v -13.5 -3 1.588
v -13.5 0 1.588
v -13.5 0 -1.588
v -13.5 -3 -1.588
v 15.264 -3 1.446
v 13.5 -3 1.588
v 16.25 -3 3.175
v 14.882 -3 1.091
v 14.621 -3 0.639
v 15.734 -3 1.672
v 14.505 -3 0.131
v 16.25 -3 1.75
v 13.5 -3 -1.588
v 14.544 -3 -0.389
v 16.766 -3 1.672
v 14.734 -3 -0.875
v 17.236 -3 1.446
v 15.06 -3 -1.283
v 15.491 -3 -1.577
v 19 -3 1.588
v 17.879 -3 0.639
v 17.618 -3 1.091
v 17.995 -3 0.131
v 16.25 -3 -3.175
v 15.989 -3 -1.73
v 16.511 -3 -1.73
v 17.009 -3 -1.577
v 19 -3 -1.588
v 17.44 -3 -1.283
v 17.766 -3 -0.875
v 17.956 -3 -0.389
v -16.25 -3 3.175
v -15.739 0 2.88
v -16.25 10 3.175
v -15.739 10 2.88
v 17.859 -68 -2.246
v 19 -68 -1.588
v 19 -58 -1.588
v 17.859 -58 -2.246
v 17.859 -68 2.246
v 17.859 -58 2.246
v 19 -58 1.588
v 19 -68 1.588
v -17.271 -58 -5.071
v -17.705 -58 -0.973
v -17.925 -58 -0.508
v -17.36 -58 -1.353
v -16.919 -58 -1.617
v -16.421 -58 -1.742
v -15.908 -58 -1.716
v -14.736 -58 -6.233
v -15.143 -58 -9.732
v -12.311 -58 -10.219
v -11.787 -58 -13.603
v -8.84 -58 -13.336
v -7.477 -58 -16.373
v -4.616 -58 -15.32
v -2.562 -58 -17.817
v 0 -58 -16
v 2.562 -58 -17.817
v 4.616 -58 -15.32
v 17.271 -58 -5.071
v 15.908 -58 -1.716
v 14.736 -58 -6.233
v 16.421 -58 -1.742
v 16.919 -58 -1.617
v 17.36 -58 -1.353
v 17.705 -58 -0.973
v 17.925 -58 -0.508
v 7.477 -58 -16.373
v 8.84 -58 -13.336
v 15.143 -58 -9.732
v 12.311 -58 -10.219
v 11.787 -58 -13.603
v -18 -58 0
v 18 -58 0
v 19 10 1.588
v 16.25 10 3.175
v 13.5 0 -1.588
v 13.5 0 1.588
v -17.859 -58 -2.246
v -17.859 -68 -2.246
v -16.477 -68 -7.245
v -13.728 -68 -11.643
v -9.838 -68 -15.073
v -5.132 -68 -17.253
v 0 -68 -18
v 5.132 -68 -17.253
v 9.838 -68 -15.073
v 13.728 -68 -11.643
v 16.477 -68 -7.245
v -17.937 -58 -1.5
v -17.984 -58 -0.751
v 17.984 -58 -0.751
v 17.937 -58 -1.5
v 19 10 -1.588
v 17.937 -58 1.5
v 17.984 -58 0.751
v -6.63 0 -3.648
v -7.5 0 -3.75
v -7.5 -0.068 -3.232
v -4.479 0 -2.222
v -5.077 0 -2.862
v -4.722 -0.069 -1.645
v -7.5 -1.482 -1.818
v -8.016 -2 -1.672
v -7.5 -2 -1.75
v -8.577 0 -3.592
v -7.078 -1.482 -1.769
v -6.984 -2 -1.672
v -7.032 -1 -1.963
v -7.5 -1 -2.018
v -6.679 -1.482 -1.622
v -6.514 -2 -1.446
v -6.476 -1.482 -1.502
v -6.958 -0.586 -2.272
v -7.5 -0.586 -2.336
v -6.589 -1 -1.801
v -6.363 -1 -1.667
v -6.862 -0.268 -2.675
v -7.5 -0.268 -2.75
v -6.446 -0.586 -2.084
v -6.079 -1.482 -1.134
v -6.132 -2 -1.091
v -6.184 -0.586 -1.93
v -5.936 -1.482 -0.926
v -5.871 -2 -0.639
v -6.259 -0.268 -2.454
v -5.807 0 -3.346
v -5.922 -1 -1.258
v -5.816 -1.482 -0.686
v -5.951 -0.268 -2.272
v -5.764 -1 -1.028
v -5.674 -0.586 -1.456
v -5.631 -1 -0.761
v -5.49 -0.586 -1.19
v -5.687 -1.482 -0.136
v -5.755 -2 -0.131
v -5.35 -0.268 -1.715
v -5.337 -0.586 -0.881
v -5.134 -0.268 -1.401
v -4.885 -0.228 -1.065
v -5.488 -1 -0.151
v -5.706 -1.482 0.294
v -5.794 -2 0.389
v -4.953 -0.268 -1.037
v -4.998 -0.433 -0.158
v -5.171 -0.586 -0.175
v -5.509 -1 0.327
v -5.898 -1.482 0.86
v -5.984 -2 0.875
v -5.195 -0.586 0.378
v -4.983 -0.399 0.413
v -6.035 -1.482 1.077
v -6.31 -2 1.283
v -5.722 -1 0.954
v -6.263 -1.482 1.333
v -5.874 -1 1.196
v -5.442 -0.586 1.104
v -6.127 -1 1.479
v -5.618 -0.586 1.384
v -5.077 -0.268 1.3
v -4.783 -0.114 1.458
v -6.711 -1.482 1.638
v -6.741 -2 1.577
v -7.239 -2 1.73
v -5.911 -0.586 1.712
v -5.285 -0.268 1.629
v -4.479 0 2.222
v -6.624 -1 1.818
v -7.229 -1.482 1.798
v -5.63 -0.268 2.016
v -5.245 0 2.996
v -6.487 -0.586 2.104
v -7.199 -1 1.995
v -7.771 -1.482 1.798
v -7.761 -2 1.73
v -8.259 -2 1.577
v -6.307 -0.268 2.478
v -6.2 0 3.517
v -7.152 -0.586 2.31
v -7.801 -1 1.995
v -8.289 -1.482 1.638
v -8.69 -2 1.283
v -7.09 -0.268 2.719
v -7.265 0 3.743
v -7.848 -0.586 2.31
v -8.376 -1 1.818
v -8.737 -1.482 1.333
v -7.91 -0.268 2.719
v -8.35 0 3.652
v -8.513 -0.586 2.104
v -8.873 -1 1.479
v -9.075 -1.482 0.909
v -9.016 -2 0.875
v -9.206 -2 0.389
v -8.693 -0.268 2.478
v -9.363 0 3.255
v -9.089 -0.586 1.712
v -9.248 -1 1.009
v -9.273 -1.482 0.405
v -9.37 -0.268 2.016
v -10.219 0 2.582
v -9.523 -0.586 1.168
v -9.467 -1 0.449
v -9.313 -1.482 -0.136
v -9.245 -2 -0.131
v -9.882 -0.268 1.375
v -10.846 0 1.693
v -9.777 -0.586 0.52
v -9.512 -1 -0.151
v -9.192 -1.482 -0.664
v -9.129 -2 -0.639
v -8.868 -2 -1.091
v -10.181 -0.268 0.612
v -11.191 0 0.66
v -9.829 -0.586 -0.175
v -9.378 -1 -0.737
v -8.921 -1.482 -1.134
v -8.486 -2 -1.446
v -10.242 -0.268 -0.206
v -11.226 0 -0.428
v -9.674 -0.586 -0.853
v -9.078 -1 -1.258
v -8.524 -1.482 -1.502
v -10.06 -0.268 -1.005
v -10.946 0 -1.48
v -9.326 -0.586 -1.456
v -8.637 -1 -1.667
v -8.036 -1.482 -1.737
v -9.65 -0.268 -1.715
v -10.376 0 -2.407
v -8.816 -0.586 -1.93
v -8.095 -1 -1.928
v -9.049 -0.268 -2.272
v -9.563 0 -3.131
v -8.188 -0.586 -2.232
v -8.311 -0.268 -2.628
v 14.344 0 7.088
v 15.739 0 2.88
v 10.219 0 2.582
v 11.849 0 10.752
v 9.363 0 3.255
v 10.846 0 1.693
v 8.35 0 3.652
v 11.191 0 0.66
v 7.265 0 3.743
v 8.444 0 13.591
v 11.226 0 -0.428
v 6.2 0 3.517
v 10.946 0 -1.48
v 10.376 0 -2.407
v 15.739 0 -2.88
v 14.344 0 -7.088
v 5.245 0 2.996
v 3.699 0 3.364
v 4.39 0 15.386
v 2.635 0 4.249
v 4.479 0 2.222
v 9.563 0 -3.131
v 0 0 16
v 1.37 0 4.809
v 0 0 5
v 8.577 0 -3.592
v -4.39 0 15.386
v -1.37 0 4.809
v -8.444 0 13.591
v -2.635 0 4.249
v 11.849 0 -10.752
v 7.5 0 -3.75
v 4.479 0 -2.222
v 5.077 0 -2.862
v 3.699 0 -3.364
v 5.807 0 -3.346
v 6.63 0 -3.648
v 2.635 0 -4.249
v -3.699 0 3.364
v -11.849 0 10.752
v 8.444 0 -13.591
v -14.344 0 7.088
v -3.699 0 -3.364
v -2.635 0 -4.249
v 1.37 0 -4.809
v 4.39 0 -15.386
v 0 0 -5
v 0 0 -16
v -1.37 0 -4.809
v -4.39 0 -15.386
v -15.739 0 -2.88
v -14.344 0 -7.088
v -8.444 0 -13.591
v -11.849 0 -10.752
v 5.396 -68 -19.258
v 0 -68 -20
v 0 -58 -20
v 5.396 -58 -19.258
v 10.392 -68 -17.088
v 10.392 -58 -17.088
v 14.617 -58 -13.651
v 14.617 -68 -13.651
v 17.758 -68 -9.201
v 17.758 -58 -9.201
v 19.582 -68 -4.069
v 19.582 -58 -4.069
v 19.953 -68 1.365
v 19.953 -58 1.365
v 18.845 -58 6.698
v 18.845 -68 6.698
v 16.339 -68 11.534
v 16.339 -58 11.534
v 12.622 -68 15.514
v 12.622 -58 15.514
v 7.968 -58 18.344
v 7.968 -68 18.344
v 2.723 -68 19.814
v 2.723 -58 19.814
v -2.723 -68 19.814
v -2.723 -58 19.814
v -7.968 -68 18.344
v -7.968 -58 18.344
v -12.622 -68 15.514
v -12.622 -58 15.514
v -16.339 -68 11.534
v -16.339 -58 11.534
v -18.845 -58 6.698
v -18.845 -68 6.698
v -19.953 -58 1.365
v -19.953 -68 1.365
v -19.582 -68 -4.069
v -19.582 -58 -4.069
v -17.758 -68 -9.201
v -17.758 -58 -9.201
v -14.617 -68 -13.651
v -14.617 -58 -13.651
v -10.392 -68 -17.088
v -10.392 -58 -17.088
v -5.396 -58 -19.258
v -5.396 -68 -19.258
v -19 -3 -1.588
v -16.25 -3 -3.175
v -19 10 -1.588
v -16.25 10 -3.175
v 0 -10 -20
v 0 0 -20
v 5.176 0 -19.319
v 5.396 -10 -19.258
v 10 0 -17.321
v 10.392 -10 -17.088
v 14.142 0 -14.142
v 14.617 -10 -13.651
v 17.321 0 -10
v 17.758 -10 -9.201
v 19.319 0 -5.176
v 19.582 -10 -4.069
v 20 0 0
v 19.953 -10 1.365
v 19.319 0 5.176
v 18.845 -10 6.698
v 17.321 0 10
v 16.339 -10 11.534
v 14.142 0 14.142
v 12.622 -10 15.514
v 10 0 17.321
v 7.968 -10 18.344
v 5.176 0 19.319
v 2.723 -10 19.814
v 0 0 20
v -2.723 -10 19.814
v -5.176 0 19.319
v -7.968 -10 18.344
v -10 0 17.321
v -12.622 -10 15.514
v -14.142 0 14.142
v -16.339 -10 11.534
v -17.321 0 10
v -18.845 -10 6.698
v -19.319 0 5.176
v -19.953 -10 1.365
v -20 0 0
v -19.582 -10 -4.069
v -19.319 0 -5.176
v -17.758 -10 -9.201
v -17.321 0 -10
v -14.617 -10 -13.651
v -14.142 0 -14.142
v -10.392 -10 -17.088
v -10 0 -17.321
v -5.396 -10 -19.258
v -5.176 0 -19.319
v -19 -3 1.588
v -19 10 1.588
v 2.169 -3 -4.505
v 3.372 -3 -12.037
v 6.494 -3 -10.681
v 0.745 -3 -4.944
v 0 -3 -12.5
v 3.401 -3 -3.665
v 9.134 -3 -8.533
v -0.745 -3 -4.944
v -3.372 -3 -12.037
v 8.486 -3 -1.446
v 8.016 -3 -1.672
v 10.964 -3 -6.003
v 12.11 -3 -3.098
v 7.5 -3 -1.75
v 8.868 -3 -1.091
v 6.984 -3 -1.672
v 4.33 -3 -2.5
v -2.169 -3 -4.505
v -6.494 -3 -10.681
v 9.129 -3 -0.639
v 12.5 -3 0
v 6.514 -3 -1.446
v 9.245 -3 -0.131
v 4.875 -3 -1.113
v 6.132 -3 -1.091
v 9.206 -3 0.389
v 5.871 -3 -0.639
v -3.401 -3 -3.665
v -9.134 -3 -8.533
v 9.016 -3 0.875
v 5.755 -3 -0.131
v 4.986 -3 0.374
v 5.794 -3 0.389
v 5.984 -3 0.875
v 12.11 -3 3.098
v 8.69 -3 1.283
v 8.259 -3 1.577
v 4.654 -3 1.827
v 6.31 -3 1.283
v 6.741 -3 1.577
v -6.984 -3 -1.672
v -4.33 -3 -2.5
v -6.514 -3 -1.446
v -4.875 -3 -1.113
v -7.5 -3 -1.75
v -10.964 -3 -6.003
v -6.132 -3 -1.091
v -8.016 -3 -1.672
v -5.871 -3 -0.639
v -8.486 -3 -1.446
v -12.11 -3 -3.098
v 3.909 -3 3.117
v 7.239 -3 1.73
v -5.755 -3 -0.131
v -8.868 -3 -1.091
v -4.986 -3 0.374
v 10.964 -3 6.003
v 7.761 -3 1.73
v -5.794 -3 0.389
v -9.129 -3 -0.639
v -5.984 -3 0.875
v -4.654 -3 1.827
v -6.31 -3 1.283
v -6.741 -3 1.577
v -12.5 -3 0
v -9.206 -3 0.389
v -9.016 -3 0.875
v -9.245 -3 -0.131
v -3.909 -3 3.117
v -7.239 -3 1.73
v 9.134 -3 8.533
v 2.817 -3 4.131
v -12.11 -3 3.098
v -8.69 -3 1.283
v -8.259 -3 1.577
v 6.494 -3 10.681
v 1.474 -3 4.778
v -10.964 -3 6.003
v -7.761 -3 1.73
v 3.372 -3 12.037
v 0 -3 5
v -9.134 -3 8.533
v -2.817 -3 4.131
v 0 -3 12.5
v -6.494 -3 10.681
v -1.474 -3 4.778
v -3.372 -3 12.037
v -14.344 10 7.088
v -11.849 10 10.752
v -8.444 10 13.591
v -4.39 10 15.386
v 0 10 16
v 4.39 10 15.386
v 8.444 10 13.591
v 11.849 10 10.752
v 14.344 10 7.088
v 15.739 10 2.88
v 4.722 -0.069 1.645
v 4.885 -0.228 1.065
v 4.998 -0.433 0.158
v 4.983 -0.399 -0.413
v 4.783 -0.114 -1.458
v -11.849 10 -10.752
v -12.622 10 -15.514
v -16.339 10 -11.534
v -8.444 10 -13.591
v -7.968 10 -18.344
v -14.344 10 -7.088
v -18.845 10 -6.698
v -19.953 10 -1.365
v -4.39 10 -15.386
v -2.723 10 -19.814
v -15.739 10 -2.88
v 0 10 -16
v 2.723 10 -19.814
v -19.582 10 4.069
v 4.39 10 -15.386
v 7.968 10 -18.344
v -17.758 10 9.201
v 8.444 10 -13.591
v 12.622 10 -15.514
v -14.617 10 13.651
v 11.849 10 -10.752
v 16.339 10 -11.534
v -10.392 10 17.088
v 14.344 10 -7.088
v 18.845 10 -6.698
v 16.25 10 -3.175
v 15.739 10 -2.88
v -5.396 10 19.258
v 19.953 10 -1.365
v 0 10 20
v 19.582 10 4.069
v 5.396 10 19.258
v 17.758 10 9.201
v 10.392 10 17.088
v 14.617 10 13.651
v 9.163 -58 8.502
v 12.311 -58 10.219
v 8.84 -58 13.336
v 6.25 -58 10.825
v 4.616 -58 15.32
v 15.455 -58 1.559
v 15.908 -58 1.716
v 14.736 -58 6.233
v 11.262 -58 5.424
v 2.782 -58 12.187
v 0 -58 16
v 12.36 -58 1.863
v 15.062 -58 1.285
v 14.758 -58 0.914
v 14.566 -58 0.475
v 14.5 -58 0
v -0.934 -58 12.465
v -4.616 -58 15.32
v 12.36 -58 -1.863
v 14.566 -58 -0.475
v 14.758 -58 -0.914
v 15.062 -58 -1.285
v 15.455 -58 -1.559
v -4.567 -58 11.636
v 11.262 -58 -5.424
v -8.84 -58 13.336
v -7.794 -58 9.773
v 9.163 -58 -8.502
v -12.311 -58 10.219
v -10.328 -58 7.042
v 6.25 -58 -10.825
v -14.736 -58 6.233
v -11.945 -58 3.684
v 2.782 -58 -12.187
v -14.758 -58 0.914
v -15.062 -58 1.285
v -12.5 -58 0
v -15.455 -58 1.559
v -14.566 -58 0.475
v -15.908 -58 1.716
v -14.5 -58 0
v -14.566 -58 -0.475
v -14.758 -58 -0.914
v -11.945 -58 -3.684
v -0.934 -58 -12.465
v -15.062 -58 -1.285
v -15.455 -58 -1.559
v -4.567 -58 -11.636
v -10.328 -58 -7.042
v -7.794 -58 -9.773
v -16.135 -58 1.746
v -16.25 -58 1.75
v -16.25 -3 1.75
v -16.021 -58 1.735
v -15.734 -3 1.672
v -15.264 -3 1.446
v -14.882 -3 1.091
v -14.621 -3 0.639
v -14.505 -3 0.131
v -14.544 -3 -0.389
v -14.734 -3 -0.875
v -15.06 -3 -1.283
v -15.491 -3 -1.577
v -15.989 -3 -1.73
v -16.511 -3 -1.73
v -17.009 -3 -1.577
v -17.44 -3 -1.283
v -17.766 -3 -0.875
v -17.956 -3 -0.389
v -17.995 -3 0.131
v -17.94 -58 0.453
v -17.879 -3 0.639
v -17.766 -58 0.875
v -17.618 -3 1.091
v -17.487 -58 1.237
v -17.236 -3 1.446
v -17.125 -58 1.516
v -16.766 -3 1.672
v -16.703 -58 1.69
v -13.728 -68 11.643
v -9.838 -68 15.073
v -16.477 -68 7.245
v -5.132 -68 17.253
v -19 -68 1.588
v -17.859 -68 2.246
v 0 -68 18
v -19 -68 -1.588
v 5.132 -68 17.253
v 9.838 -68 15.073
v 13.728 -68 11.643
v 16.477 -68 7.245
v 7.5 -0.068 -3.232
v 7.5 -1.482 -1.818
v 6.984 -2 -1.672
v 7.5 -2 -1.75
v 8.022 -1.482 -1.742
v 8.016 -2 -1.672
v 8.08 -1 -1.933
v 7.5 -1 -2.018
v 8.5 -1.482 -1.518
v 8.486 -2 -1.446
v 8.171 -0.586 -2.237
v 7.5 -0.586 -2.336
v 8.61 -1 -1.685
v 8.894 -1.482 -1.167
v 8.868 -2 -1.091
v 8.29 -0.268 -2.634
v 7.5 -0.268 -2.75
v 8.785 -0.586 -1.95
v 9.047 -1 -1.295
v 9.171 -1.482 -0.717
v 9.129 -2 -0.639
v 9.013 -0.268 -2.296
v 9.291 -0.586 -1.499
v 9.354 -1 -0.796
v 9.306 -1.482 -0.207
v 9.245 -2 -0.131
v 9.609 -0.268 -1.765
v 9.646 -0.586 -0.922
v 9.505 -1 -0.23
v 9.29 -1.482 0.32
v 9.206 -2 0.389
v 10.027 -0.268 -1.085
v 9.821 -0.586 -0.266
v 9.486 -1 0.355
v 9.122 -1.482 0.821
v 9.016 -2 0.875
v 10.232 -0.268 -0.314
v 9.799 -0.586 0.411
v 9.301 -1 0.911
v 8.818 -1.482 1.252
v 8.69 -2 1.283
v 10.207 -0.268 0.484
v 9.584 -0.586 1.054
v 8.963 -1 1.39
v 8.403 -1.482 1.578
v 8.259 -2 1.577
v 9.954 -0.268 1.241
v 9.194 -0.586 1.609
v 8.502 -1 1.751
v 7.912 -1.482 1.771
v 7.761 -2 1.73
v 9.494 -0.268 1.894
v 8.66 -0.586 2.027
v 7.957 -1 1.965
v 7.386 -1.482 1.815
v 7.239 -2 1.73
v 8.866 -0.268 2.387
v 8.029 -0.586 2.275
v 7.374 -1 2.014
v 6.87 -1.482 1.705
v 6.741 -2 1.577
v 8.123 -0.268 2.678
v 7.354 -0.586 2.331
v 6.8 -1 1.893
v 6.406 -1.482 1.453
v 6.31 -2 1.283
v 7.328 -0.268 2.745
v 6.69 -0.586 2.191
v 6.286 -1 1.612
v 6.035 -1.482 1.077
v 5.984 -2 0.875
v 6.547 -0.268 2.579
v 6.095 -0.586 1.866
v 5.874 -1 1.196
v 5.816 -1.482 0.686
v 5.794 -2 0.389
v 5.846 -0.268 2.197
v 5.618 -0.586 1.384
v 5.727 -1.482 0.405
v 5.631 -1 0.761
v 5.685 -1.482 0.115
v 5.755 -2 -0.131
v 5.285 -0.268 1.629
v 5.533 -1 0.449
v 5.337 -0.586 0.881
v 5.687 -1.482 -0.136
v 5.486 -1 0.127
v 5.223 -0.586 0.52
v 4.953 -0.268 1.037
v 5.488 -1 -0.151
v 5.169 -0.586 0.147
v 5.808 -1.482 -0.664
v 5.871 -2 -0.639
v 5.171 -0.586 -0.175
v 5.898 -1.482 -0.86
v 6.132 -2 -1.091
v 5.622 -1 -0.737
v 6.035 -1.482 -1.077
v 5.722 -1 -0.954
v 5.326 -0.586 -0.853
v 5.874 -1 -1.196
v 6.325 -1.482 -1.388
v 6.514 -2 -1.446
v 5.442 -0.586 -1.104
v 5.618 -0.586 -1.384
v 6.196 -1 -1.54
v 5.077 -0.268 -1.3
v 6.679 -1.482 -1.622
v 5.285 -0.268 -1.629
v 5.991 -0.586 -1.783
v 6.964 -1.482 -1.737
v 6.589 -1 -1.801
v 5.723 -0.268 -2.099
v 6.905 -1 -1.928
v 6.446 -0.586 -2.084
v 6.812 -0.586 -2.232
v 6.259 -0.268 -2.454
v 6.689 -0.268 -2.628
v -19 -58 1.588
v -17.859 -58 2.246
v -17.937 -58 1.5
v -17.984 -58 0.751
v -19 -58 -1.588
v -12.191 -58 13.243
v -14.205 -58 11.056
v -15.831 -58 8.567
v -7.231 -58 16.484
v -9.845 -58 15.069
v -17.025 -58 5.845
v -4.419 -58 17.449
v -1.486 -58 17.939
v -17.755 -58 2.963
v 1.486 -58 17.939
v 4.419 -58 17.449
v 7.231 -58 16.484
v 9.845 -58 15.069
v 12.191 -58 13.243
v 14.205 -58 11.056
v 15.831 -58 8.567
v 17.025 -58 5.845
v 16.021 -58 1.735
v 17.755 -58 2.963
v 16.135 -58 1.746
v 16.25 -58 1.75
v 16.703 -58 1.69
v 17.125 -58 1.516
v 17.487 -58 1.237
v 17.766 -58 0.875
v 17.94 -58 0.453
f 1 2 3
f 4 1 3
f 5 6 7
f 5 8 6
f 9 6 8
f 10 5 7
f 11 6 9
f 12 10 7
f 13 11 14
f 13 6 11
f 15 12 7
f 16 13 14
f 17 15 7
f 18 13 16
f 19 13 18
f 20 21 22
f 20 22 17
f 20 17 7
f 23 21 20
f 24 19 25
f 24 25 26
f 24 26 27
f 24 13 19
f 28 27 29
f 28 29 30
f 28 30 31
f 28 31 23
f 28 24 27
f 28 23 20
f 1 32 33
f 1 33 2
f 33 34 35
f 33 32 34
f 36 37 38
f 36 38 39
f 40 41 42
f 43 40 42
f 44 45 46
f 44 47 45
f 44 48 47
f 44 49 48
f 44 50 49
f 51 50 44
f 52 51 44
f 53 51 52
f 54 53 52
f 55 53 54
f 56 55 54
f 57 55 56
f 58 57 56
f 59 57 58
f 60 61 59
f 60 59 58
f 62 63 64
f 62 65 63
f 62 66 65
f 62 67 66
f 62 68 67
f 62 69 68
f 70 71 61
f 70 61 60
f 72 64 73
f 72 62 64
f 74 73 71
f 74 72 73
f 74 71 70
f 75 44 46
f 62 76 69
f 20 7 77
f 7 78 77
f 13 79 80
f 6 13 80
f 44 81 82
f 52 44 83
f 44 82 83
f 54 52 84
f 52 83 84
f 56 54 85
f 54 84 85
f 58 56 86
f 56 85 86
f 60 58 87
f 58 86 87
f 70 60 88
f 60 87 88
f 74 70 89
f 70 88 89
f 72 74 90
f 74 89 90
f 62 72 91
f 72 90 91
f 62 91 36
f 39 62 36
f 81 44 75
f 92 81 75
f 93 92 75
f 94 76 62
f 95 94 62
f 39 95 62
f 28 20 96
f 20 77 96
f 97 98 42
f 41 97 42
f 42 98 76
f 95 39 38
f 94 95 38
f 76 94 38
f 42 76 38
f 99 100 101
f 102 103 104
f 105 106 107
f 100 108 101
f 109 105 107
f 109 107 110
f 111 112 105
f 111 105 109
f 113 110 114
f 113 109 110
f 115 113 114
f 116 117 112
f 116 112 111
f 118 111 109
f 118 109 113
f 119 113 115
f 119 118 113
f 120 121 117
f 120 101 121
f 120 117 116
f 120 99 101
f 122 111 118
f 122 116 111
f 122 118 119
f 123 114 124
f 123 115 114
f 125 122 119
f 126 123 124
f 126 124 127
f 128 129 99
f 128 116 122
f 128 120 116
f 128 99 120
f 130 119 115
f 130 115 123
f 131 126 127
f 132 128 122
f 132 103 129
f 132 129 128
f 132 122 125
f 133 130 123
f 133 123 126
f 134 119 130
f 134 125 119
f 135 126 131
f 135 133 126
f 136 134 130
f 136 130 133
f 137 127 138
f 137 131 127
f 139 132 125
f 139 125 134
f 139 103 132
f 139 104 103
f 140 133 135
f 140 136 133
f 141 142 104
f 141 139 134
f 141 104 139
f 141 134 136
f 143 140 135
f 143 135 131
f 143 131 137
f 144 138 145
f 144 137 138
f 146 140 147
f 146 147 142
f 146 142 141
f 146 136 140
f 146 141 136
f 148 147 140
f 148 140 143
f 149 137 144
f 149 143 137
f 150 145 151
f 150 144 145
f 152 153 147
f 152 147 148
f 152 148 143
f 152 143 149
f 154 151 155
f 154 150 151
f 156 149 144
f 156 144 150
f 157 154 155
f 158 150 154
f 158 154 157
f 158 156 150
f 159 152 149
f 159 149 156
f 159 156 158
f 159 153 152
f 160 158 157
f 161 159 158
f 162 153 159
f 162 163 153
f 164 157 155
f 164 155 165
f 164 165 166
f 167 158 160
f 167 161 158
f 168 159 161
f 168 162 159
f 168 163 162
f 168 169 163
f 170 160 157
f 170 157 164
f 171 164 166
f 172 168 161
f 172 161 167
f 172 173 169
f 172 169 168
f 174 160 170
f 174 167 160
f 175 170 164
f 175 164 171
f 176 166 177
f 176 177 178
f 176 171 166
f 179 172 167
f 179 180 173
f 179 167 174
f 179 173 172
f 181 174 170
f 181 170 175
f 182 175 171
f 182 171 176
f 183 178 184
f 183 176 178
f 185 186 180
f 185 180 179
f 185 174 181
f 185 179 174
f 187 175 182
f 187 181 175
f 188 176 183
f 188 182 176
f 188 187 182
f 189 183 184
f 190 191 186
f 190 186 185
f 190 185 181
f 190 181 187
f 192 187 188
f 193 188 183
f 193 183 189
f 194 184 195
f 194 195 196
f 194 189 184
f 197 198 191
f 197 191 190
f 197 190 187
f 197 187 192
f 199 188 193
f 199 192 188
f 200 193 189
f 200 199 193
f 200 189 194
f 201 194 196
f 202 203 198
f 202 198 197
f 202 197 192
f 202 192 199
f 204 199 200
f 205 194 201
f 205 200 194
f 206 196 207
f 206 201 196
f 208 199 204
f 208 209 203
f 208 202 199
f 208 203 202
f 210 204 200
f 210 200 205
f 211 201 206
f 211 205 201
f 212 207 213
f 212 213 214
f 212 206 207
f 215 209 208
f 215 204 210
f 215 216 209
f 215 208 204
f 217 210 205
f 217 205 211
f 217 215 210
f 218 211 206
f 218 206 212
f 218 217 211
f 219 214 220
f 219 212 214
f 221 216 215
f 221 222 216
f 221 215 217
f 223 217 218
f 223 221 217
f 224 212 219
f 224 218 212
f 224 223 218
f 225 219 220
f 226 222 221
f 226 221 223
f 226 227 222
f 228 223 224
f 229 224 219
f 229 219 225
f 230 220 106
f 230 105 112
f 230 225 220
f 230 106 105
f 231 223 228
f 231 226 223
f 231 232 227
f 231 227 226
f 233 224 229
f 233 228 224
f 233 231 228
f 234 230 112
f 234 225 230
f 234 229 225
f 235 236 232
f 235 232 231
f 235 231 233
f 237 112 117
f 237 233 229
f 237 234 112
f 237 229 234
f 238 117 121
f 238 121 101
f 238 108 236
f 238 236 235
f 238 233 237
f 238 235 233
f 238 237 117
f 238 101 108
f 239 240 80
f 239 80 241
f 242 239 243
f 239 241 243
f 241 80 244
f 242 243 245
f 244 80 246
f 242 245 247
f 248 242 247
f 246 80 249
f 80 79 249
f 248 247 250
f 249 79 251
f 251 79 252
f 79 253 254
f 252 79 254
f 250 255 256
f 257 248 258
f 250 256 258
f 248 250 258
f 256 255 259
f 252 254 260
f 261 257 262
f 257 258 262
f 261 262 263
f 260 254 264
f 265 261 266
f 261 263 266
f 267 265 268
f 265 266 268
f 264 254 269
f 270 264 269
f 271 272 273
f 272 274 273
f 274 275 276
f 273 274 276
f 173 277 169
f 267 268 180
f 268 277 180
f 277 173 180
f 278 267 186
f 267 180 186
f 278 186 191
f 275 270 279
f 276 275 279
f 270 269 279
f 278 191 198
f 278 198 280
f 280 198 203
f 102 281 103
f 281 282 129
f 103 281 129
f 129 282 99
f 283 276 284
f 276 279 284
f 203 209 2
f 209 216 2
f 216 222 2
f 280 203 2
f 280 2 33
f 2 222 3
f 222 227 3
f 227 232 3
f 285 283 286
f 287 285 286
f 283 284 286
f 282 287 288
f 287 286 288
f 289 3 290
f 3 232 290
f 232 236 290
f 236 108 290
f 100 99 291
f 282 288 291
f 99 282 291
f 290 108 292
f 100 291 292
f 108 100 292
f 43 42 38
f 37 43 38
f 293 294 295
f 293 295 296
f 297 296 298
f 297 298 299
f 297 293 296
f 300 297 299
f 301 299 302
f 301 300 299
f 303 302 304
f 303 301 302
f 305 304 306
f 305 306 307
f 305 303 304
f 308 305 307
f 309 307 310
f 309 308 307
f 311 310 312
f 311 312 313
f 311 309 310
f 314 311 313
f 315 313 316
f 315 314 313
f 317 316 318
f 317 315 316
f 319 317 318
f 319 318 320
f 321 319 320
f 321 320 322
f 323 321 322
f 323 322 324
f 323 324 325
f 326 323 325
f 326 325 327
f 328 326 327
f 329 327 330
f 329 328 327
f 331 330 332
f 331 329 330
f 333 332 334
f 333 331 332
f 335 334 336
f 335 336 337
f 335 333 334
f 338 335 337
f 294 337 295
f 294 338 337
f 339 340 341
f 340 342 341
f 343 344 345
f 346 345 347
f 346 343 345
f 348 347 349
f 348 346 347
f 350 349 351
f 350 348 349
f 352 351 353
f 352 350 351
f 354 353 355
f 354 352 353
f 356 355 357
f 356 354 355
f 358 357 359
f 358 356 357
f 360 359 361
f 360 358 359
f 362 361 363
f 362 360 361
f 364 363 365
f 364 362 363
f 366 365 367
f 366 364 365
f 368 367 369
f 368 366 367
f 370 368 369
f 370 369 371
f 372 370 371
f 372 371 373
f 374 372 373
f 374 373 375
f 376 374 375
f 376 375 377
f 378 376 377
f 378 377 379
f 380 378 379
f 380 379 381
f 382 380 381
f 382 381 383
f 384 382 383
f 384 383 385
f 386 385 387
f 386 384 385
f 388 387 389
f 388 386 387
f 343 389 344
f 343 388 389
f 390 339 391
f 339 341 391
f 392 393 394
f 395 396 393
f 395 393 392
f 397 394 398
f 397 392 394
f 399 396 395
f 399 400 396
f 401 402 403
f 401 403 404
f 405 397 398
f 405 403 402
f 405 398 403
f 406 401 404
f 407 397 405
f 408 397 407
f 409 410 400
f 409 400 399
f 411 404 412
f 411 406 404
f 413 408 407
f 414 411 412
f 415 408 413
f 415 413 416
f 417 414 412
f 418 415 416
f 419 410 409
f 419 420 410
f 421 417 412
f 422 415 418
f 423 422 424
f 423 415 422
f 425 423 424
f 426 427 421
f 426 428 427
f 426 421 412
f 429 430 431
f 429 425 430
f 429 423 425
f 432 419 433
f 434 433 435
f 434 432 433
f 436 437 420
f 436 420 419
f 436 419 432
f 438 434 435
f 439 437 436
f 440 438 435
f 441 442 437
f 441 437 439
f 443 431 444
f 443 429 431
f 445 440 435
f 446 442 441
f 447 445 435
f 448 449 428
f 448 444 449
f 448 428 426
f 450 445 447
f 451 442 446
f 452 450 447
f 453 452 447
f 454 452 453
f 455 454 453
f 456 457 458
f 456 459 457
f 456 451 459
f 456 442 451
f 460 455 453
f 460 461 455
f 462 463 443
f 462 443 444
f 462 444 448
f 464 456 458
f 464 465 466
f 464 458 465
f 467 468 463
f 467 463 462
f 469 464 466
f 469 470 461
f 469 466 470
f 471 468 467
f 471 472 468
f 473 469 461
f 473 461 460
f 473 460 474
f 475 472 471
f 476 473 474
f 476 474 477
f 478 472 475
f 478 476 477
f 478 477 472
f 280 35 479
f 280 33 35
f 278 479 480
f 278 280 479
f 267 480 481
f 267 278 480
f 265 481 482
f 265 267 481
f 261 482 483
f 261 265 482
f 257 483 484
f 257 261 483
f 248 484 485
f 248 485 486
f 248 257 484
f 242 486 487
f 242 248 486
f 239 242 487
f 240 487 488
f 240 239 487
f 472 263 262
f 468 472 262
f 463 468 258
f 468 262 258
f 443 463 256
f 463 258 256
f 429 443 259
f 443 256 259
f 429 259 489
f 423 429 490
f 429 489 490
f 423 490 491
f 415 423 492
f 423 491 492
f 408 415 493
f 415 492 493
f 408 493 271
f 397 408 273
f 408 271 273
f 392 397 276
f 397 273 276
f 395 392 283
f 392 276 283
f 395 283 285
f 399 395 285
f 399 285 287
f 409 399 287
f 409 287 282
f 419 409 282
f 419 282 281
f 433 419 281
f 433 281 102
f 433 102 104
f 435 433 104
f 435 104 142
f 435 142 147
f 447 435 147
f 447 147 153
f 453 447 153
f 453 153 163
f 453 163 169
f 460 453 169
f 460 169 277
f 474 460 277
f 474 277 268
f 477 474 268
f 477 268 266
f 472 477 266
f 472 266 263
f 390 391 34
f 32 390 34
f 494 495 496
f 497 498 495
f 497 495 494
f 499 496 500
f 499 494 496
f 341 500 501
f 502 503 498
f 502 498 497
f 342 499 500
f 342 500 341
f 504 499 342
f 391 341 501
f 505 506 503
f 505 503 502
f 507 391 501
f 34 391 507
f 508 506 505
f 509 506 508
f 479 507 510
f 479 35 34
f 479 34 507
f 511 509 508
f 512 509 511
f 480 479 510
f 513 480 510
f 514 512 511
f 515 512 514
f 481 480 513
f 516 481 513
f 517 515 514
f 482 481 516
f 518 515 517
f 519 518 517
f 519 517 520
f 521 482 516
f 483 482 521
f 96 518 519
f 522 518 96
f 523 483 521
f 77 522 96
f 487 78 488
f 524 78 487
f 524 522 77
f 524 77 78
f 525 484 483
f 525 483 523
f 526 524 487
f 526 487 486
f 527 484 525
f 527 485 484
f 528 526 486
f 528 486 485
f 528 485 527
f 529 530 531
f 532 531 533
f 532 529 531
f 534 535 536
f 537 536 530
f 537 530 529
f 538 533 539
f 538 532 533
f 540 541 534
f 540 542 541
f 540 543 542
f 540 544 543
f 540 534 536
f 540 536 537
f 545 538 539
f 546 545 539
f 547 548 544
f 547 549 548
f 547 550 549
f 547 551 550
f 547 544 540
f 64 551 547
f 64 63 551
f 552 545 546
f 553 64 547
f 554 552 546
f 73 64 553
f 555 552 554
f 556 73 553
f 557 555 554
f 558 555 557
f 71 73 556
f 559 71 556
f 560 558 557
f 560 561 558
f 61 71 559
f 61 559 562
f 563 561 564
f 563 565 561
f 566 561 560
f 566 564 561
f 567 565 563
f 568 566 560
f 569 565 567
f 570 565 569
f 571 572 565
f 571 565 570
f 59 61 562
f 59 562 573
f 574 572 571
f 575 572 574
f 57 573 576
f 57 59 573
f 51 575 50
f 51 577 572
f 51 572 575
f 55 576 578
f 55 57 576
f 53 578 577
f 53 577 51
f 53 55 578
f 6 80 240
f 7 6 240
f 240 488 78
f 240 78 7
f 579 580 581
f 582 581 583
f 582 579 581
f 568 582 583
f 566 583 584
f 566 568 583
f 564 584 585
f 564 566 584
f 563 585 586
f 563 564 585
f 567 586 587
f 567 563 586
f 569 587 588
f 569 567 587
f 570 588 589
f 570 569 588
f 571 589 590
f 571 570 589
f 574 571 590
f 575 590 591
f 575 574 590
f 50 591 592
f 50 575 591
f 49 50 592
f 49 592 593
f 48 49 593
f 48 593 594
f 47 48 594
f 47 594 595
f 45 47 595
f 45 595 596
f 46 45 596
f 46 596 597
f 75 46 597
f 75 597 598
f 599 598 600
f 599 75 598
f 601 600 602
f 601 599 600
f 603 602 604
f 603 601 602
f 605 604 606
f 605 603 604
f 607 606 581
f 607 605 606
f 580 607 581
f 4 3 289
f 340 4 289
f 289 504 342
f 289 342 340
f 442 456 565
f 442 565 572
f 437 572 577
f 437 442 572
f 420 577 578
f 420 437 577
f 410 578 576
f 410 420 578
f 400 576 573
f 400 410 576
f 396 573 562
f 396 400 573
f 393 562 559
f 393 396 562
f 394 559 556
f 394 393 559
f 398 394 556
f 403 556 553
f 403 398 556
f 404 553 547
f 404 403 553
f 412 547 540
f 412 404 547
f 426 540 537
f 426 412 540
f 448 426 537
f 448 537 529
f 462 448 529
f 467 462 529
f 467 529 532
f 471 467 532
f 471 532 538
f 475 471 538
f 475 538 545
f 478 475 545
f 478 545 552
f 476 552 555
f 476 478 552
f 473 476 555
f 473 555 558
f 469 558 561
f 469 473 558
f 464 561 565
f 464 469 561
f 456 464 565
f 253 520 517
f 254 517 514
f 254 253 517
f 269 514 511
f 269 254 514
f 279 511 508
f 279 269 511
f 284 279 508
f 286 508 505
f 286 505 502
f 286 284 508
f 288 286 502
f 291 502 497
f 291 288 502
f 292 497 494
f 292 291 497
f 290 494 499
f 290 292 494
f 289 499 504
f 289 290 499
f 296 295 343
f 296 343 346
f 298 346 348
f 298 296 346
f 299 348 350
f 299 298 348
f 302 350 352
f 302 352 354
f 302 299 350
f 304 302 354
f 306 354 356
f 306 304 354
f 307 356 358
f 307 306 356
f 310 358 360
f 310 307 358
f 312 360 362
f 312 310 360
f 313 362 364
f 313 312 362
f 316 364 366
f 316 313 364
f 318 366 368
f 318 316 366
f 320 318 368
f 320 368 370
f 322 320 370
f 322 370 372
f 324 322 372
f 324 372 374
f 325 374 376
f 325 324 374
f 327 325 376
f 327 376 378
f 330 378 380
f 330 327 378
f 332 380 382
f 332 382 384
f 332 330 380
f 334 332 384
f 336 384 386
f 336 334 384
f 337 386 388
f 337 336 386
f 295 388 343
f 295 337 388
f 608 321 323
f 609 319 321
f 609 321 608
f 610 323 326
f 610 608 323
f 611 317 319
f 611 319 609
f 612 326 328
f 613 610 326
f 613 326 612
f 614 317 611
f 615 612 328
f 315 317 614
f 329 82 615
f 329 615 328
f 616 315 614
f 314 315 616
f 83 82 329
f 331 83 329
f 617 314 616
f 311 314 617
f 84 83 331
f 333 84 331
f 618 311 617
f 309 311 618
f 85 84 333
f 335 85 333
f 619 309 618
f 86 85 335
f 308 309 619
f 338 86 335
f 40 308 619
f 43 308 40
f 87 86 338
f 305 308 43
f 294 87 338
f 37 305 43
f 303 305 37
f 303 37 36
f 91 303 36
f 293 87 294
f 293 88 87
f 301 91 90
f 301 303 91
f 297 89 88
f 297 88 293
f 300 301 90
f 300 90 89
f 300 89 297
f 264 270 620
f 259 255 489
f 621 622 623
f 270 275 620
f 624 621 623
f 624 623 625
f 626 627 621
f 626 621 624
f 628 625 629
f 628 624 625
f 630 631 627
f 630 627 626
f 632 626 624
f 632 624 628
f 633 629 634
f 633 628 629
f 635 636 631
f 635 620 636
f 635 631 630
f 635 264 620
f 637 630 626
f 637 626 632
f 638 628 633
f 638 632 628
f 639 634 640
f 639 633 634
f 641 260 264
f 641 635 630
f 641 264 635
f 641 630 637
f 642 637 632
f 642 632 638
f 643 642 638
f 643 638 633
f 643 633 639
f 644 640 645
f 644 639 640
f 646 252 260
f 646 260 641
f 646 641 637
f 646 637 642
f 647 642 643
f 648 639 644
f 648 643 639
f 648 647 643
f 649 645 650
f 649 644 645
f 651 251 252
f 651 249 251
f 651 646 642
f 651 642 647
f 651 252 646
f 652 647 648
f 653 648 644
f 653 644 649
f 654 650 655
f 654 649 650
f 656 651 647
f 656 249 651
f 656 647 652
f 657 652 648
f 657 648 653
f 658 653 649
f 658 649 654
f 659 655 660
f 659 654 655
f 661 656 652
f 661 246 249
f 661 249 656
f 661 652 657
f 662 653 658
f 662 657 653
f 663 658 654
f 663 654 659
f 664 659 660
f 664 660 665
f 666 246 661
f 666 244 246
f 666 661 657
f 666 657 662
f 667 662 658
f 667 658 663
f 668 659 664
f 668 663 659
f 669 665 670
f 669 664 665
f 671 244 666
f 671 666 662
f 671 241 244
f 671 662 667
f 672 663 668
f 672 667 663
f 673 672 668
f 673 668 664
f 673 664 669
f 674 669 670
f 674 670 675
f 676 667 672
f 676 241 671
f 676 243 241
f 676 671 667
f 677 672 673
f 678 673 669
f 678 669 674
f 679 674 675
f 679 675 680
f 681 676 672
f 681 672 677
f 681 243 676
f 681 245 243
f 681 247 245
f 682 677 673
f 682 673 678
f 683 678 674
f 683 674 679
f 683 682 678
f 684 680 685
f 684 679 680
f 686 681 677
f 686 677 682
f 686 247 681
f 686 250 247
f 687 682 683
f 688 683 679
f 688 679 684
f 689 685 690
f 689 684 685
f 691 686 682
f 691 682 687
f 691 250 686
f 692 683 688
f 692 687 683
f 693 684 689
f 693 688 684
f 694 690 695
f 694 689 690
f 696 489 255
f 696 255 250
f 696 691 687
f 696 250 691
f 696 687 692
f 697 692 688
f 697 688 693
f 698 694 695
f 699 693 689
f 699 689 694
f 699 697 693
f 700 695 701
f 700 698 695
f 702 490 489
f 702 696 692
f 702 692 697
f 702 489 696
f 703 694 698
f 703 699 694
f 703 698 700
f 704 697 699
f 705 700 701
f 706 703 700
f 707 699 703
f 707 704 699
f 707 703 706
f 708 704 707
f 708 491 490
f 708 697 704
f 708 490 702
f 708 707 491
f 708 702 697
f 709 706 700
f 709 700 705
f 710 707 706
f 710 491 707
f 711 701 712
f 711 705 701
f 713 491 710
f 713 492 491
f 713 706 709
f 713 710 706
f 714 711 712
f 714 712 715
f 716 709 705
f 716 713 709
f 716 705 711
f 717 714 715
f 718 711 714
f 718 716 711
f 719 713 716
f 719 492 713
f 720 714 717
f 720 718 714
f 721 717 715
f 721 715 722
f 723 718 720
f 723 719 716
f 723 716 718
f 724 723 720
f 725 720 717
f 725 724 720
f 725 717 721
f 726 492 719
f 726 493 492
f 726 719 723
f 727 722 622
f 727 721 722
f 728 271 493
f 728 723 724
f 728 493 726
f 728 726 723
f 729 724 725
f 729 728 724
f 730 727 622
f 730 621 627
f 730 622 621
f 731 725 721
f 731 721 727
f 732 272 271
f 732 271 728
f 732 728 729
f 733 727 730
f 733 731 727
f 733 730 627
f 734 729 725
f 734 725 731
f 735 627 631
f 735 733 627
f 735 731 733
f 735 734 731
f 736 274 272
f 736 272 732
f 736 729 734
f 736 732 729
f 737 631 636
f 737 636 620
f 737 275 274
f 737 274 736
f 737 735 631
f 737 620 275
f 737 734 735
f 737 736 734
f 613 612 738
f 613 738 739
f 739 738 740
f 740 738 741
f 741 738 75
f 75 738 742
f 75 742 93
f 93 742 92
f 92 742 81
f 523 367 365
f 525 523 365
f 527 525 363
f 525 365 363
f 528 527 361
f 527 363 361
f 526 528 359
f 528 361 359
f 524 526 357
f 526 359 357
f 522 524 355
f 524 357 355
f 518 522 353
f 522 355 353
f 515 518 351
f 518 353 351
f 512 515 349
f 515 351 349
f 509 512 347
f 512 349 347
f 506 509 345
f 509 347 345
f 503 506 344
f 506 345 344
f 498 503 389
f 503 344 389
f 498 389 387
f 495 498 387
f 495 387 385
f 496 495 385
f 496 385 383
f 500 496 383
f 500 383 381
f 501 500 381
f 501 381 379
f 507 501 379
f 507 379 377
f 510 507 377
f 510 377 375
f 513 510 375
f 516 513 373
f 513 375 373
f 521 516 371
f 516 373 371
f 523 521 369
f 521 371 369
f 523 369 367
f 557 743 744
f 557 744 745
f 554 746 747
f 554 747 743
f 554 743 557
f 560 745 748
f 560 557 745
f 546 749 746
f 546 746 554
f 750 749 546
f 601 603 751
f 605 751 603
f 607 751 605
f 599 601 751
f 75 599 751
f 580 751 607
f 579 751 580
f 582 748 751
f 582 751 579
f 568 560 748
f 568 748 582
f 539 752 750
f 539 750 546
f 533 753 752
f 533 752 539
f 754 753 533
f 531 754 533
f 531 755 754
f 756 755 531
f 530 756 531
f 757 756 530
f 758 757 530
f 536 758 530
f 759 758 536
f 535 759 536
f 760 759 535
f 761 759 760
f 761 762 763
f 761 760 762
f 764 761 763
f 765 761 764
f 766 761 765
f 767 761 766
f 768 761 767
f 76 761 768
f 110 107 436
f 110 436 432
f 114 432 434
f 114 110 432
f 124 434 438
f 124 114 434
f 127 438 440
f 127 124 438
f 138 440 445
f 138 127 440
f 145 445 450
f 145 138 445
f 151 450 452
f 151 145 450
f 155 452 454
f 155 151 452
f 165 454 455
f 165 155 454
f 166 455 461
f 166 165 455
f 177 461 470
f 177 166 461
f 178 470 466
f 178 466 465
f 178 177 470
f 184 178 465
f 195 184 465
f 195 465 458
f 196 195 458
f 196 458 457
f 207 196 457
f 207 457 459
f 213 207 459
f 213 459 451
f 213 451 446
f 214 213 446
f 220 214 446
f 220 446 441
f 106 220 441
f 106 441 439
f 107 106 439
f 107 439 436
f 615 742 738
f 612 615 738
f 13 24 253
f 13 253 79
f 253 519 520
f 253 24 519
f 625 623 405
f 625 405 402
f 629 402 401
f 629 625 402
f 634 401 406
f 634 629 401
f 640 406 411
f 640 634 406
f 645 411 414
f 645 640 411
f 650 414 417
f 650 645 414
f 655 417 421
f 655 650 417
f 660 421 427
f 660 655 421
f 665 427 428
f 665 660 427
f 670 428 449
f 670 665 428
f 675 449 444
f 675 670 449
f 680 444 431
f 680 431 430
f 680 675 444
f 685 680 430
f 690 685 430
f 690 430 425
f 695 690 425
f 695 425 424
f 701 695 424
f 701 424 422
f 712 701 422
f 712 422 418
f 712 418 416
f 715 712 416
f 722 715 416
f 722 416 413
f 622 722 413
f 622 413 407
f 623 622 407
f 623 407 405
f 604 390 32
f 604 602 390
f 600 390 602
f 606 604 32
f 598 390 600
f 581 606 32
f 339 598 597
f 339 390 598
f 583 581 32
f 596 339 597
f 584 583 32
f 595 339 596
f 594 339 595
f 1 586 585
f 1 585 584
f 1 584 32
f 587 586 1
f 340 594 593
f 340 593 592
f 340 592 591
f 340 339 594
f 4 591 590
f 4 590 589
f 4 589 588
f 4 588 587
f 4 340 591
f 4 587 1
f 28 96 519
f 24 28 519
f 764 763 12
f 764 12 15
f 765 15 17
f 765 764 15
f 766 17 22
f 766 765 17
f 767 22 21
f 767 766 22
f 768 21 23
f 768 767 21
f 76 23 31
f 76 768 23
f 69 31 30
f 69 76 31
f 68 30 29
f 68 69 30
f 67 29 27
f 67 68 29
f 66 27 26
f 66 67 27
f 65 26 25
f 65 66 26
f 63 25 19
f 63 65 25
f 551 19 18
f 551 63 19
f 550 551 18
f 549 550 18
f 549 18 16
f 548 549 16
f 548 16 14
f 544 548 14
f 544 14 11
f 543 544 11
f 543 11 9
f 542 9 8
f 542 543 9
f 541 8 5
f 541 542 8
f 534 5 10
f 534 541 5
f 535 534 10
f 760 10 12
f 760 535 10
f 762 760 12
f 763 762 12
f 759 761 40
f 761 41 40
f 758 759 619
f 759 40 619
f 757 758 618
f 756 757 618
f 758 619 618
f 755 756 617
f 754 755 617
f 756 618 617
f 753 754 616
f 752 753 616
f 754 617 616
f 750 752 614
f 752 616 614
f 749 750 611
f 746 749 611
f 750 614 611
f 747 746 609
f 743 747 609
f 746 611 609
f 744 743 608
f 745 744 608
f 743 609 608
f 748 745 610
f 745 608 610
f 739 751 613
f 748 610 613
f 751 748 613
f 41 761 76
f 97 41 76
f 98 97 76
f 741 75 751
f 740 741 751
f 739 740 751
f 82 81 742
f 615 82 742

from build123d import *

# Parameters (mm, degrees)
SKETCH1_R                 = 20
SKETCH1_R_2               = 16
BOSS_EXTRUDE1_DEPTH       = 10
SKETCH2_R                 = 1.75
BOSS_EXTRUDE2_DEPTH       = 3
BOSS_EXTRUDE2_2_DEPTH     = 3
BOSS_EXTRUDE3_OUTLINE_R   = 16
BOSS_EXTRUDE3_OUTLINE_R_2 = 12.5
BOSS_EXTRUDE3_DEPTH       = 58
FILLET1_R                 = 5
BOSS_EXTRUDE4_START       = 10
SKETCH3_R                 = 20
SKETCH3_R_2               = 14.5
BOSS_EXTRUDE4_DEPTH       = 10
CUT_EXTRUDE1_DEPTH        = 25
CUT_EXTRUDE2_DEPTH        = 3
BOSS_EXTRUDE5_START       = 48
SKETCH5_R                 = 20
SKETCH5_R_2               = 12.5
BOSS_EXTRUDE5_DEPTH       = 48
SKETCH6_R                 = 1.75
BOSS_EXTRUDE7_DEPTH       = 3
SKETCH7_R                 = 5
CUT_EXTRUDE3_DEPTH        = 3
CUT_EXTRUDE4_DEPTH        = 62.846584384
CUT_EXTRUDE4_DEPTH_BACK   = 62.846584384
SKETCH9_R                 = 1.75
BOSS_EXTRUDE8_START       = 10
SKETCH10_R                = 20
SKETCH10_R_2              = 18
BOSS_EXTRUDE8_DEPTH       = 10
FILLET5_R                 = 2
CUT_EXTRUDE5_START        = 39.893559
CUT_EXTRUDE5_DEPTH        = 10


# Read off the part's stored shape, not the designer's step: Boss-Extrude3
with BuildPart() as part:
    # Sketch1 → Boss-Extrude1 (new body)
    with BuildSketch(Plane(origin=(0, 0, 0), x_dir=(1, 0, 0), z_dir=(0, 1, 0))):
        with Locations(Location((0, 0, 0), (0, 0, 270))):
            Circle(SKETCH1_R)
        with Locations(Location((0, 0, 0), (0, 0, 270))):
            Circle(SKETCH1_R_2, mode=Mode.SUBTRACT)
    extrude(amount=BOSS_EXTRUDE1_DEPTH)



with BuildPart() as body_2:
    # Sketch2 → Boss-Extrude2 (new body)
    with BuildSketch(Plane(origin=(0, 0, 0), x_dir=(-1, 0, 0), z_dir=(0, -1, 0))):
        with BuildLine():
            Line((-9.387458609, 2), (-15.874507866, 2))
            ThreePointArc((-15.874507866, 2), (-16, 0), (-15.874507866, -2))
            Line((-15.874507866, -2), (-9.387458609, -2))
            ThreePointArc((-9.387458609, -2), (-4.75, 0), (-9.387458609, 2))
        make_face()
        with Locations(Location((-7.5, 0, 0), (0, 0, 90))):
            Circle(SKETCH2_R, mode=Mode.SUBTRACT)
    extrude(amount=BOSS_EXTRUDE2_DEPTH)


with BuildPart() as body_3:
    # Sketch2 → Boss-Extrude2 2 (new body)
    with BuildSketch(Plane(origin=(0, 0, 0), x_dir=(-1, 0, 0), z_dir=(0, -1, 0))):
        with BuildLine():
            Line((9.387458609, -2), (15.874507866, -2))
            ThreePointArc((15.874507866, -2), (16, 0), (15.874507866, 2))
            Line((15.874507866, 2), (9.387458609, 2))
            ThreePointArc((9.387458609, 2), (4.75, 0), (9.387458609, -2))
        make_face()
        with Locations(Location((7.5, 0, 0), (0, 0, 90))):
            Circle(SKETCH2_R, mode=Mode.SUBTRACT)
    extrude(amount=BOSS_EXTRUDE2_2_DEPTH)


    add(body_2.part)  # Boss-Extrude3 merges body 2
    # Boss-Extrude3 outline → Boss-Extrude3 (add)
    with BuildSketch(Plane(origin=(0, 0, 0), x_dir=(-1, 0, 0), z_dir=(0, -1, 0))):
        Circle(BOSS_EXTRUDE3_OUTLINE_R)
        Circle(BOSS_EXTRUDE3_OUTLINE_R_2, mode=Mode.SUBTRACT)
    extrude(amount=BOSS_EXTRUDE3_DEPTH)

    # Fillet1
    # the kernel refuses this fillet: 5 mm, written as the material it adds along each edge
    with BuildSketch(Plane(origin=(-12.338962679, -3, 2), x_dir=(0.44041013703938037, 0, 0.8977966981410402), z_dir=(0, 1, 0)), Plane(origin=(12.338962679, -3, -2), x_dir=(-0.4404101370393726, 0, -0.897796698141044), z_dir=(0, 1, 0))) as fillet1_piece_1:
        with BuildLine():
            CenterArc((5.821777357, 4.78348009), FILLET1_R, 205.259956012, 81.663200185)
            Line((1.299872312, 2.649850609), (1.209434211, 2.607178019))
            ThreePointArc((1.209434211, 2.607178019), (0.560156486, 1.368966318), (-0.08977967, 0.044041014))
            Line((-0.08977967, 0.044041014), (-0.029108887, -0.095669602))
            ThreePointArc((-0.029108887, -0.095669602), (3.638610848, -0.641299774), (7.306330583, -0.095669602))
            Line((7.306330583, -0.095669602), (7.277221696, 0))
        make_face()
    extrude(amount=3)
    with BuildSketch(Plane(origin=(-12.338962679, -3, -2), x_dir=(0.44041013703938064, 0, -0.8977966981410401), z_dir=(0, 1, 0)), Plane(origin=(12.338962679, -3, 2), x_dir=(-0.44041013703937265, 0, 0.8977966981410441), z_dir=(0, 1, 0))) as fillet1_piece_2:
        with BuildLine():
            CenterArc((5.821777357, -4.78348009), FILLET1_R, 73.076843803, 81.663200185)
            Line((1.299872312, -2.649850609), (1.209434211, -2.607178019))
            ThreePointArc((1.209434211, -2.607178019), (0.560156486, -1.368966318), (-0.08977967, -0.044041014))
            Line((-0.08977967, -0.044041014), (-0.029108887, 0.095669602))
            ThreePointArc((-0.029108887, 0.095669602), (3.638610848, 0.641299774), (7.306330583, 0.095669602))
            Line((7.306330583, 0.095669602), (7.277221696, 0))
        make_face()
    extrude(amount=3)


with BuildPart() as part_1:
    add(part.part)

    add(body_3.part)  # Boss-Extrude4 merges body 3
    # Sketch3 → Boss-Extrude4 (add)
    with BuildSketch(Plane(origin=(0, 0, 0), x_dir=(-1, 0, 0), z_dir=(0, -1, 0)).offset(BOSS_EXTRUDE4_START)):
        with Locations(Location((0, 0, 0), (0, 0, 90))):
            Circle(SKETCH3_R)
        Circle(SKETCH3_R_2, mode=Mode.SUBTRACT)
    extrude(amount=-BOSS_EXTRUDE4_DEPTH)

    # Sketch4 → Cut-Extrude1 (cut)
    with BuildSketch(Plane(origin=(0, 0, 0), x_dir=(1, 0, 0), z_dir=(0, 1, 0))):
        Polygon((-16.25, 3.175426481), (-19, 1.58771324), (-19, -1.58771324), (-16.25, -3.175426481), (-13.5, -1.58771324), (-13.5, 1.58771324), align=None)
        Polygon((16.25, 3.175426481), (13.5, 1.58771324), (13.5, -1.58771324), (16.25, -3.175426481), (19, -1.58771324), (19, 1.58771324), align=None)
    extrude(amount=CUT_EXTRUDE1_DEPTH, mode=Mode.SUBTRACT)

    # Sketch4<3> → Cut-Extrude2 (cut)
    with BuildSketch(Plane(origin=(0, 0, 0), x_dir=(1, 0, 0), z_dir=(0, 1, 0))):
        Polygon((-16.25, 3.175426481), (-19, 1.58771324), (-19, -1.58771324), (-16.25, -3.175426481), (-13.5, -1.58771324), (-13.5, 1.58771324), align=None)
        Polygon((16.25, 3.175426481), (13.5, 1.58771324), (13.5, -1.58771324), (16.25, -3.175426481), (19, -1.58771324), (19, 1.58771324), align=None)
    extrude(amount=-CUT_EXTRUDE2_DEPTH, mode=Mode.SUBTRACT)

    # Sketch5 → Boss-Extrude5 (add)
    with BuildSketch(Plane(origin=(0, -10, 0), x_dir=(-1, 0, 0), z_dir=(0, -1, 0)).offset(BOSS_EXTRUDE5_START)):
        with Locations(Location((0, 0, 0), (0, 0, 90))):
            Circle(SKETCH5_R)
        with Locations(Location((0, 0, 0), (0, 0, 223.053208616))):
            Circle(SKETCH5_R_2, mode=Mode.SUBTRACT)
    extrude(amount=-BOSS_EXTRUDE5_DEPTH)

    # Sketch6 → Boss-Extrude7 (add)
    # profile 1 of 3: a face of its own
    with BuildSketch(Plane(origin=(0, 0, 0), x_dir=(1, 0, 0), z_dir=(0, 1, 0))):
        with BuildLine():
            ThreePointArc((9.387458609, 2), (4.75, 0), (9.387458609, -2))
            ThreePointArc((9.387458609, -2), (10.476642124, -5.313902708), (9.134000475, -8.533465611))
            ThreePointArc((9.134000475, -8.533465611), (0, -12.5), (-9.134000475, -8.533465611))
            ThreePointArc((-9.134000475, -8.533465611), (-10.476642124, -5.313902708), (-9.387458609, -2))
            ThreePointArc((-9.387458609, -2), (-4.75, 0), (-9.387458609, 2))
            ThreePointArc((-9.387458609, 2), (-10.476642124, 5.313902708), (-9.134000475, 8.533465611))
            ThreePointArc((-9.134000475, 8.533465611), (0, 12.5), (9.134000475, 8.533465611))
            ThreePointArc((9.134000475, 8.533465611), (10.476642124, 5.313902708), (9.387458609, 2))
        make_face()
    # profile 2 of 3: a face of its own
    with BuildSketch(Plane(origin=(0, 0, 0), x_dir=(1, 0, 0), z_dir=(0, 1, 0))):
        with BuildLine():
            ThreePointArc((-9.387458609, 2), (-10.476642124, 5.313902708), (-9.134000475, 8.533465611))
            ThreePointArc((-9.134000475, 8.533465611), (-12.5, 0), (-9.134000475, -8.533465611))
            ThreePointArc((-9.134000475, -8.533465611), (-10.476642124, -5.313902708), (-9.387458609, -2))
            ThreePointArc((-9.387458609, -2), (-4.75, 0), (-9.387458609, 2))
        make_face()
        with Locations(Location((-7.5, 0, 0), (0, 0, 90))):
            Circle(SKETCH6_R, mode=Mode.SUBTRACT)
    # profile 3 of 3: a face of its own
    with BuildSketch(Plane(origin=(0, 0, 0), x_dir=(1, 0, 0), z_dir=(0, 1, 0))):
        with BuildLine():
            ThreePointArc((9.134000475, -8.533465611), (11.628091114, -4.586665132), (12.5, 0))
            ThreePointArc((12.5, 0), (11.628091114, 4.586665132), (9.134000475, 8.533465611))
            ThreePointArc((9.134000475, 8.533465611), (10.476642124, 5.313902708), (9.387458609, 2))
            ThreePointArc((9.387458609, 2), (4.75, 0), (9.387458609, -2))
            ThreePointArc((9.387458609, -2), (10.476642124, -5.313902708), (9.134000475, -8.533465611))
        make_face()
        with Locations(Location((7.5, 0, 0), (0, 0, 90))):
            Circle(SKETCH6_R, mode=Mode.SUBTRACT)
    extrude(amount=-BOSS_EXTRUDE7_DEPTH)

    # Sketch7 → Cut-Extrude3 (cut)
    with BuildSketch(Plane(origin=(0, 0, 0), x_dir=(1, 0, 0), z_dir=(0, 1, 0))):
        with Locations(Location((0, 0, 0), (0, 0, 270))):
            Circle(SKETCH7_R)
    extrude(amount=-CUT_EXTRUDE3_DEPTH, mode=Mode.SUBTRACT)

    # Sketch9 → Cut-Extrude4 (cut, two sides: drawn at the far end of the back side and taken through both)
    with BuildSketch(Plane(origin=(0, -3, 0), x_dir=(1, 0, 0), z_dir=(0, 1, 0)).offset(-CUT_EXTRUDE4_DEPTH_BACK)):
        with Locations(Location((-16.25, 0, 0), (0, 0, 270))):
            Circle(SKETCH9_R)
        with Locations(Location((16.25, 0, 0), (0, 0, 270))):
            Circle(SKETCH9_R)
    extrude(amount=CUT_EXTRUDE4_DEPTH + CUT_EXTRUDE4_DEPTH_BACK, mode=Mode.SUBTRACT)

    # Sketch10 → Boss-Extrude8 (add)
    with BuildSketch(Plane(origin=(0, -58, 0), x_dir=(-1, 0, 0), z_dir=(0, -1, 0)).offset(BOSS_EXTRUDE8_START)):
        with Locations(Location((0, 0, 0), (0, 0, 90))):
            Circle(SKETCH10_R)
        Circle(SKETCH10_R_2, mode=Mode.SUBTRACT)
    extrude(amount=-BOSS_EXTRUDE8_DEPTH)

    # Fillet5
    # the kernel refuses this fillet: 2 mm, written as the material it takes off along each edge
    with BuildSketch(Plane(origin=(7.5, 0, 0), x_dir=(0, 0, -1), z_dir=(-1, 0, 0))) as fillet5_piece_1:
        with BuildLine():
            CenterArc((1.75 + FILLET5_R, FILLET5_R), FILLET5_R, 180, 90)
            Line((1.75 + FILLET5_R, 0), (1.75, 0))
            Line((1.75, 0), (1.75, FILLET5_R))
        make_face()
    revolve(axis=Axis((7.5, 0, 0), (0, -1, 0)), mode=Mode.SUBTRACT)
    with BuildSketch(Plane(origin=(-7.5, 0, 0), x_dir=(0, 0, -1), z_dir=(-1, 0, 0))) as fillet5_piece_2:
        with BuildLine():
            CenterArc((1.75 + FILLET5_R, FILLET5_R), FILLET5_R, 180, 90)
            Line((1.75 + FILLET5_R, 0), (1.75, 0))
            Line((1.75, 0), (1.75, FILLET5_R))
        make_face()
    revolve(axis=Axis((-7.5, 0, 0), (0, -1, 0)), mode=Mode.SUBTRACT)

    # Sketch11 → Cut-Extrude5 (cut)
    with BuildSketch(Plane(origin=(0, -107.893559475, 0), x_dir=(1, 0, 0), z_dir=(0, 1, 0)).offset(CUT_EXTRUDE5_START)):
        Polygon((16.25, 3.175426481), (13.5, 1.58771324), (13.5, -1.58771324), (16.25, -3.175426481), (19, -1.58771324), (19, 1.58771324), align=None)
        Polygon((-16.25, 3.175426481), (-19, 1.58771324), (-19, -1.58771324), (-16.25, -3.175426481), (-13.5, -1.58771324), (-13.5, 1.58771324), align=None)
    extrude(amount=CUT_EXTRUDE5_DEPTH, mode=Mode.SUBTRACT)


solid = part_1.part
